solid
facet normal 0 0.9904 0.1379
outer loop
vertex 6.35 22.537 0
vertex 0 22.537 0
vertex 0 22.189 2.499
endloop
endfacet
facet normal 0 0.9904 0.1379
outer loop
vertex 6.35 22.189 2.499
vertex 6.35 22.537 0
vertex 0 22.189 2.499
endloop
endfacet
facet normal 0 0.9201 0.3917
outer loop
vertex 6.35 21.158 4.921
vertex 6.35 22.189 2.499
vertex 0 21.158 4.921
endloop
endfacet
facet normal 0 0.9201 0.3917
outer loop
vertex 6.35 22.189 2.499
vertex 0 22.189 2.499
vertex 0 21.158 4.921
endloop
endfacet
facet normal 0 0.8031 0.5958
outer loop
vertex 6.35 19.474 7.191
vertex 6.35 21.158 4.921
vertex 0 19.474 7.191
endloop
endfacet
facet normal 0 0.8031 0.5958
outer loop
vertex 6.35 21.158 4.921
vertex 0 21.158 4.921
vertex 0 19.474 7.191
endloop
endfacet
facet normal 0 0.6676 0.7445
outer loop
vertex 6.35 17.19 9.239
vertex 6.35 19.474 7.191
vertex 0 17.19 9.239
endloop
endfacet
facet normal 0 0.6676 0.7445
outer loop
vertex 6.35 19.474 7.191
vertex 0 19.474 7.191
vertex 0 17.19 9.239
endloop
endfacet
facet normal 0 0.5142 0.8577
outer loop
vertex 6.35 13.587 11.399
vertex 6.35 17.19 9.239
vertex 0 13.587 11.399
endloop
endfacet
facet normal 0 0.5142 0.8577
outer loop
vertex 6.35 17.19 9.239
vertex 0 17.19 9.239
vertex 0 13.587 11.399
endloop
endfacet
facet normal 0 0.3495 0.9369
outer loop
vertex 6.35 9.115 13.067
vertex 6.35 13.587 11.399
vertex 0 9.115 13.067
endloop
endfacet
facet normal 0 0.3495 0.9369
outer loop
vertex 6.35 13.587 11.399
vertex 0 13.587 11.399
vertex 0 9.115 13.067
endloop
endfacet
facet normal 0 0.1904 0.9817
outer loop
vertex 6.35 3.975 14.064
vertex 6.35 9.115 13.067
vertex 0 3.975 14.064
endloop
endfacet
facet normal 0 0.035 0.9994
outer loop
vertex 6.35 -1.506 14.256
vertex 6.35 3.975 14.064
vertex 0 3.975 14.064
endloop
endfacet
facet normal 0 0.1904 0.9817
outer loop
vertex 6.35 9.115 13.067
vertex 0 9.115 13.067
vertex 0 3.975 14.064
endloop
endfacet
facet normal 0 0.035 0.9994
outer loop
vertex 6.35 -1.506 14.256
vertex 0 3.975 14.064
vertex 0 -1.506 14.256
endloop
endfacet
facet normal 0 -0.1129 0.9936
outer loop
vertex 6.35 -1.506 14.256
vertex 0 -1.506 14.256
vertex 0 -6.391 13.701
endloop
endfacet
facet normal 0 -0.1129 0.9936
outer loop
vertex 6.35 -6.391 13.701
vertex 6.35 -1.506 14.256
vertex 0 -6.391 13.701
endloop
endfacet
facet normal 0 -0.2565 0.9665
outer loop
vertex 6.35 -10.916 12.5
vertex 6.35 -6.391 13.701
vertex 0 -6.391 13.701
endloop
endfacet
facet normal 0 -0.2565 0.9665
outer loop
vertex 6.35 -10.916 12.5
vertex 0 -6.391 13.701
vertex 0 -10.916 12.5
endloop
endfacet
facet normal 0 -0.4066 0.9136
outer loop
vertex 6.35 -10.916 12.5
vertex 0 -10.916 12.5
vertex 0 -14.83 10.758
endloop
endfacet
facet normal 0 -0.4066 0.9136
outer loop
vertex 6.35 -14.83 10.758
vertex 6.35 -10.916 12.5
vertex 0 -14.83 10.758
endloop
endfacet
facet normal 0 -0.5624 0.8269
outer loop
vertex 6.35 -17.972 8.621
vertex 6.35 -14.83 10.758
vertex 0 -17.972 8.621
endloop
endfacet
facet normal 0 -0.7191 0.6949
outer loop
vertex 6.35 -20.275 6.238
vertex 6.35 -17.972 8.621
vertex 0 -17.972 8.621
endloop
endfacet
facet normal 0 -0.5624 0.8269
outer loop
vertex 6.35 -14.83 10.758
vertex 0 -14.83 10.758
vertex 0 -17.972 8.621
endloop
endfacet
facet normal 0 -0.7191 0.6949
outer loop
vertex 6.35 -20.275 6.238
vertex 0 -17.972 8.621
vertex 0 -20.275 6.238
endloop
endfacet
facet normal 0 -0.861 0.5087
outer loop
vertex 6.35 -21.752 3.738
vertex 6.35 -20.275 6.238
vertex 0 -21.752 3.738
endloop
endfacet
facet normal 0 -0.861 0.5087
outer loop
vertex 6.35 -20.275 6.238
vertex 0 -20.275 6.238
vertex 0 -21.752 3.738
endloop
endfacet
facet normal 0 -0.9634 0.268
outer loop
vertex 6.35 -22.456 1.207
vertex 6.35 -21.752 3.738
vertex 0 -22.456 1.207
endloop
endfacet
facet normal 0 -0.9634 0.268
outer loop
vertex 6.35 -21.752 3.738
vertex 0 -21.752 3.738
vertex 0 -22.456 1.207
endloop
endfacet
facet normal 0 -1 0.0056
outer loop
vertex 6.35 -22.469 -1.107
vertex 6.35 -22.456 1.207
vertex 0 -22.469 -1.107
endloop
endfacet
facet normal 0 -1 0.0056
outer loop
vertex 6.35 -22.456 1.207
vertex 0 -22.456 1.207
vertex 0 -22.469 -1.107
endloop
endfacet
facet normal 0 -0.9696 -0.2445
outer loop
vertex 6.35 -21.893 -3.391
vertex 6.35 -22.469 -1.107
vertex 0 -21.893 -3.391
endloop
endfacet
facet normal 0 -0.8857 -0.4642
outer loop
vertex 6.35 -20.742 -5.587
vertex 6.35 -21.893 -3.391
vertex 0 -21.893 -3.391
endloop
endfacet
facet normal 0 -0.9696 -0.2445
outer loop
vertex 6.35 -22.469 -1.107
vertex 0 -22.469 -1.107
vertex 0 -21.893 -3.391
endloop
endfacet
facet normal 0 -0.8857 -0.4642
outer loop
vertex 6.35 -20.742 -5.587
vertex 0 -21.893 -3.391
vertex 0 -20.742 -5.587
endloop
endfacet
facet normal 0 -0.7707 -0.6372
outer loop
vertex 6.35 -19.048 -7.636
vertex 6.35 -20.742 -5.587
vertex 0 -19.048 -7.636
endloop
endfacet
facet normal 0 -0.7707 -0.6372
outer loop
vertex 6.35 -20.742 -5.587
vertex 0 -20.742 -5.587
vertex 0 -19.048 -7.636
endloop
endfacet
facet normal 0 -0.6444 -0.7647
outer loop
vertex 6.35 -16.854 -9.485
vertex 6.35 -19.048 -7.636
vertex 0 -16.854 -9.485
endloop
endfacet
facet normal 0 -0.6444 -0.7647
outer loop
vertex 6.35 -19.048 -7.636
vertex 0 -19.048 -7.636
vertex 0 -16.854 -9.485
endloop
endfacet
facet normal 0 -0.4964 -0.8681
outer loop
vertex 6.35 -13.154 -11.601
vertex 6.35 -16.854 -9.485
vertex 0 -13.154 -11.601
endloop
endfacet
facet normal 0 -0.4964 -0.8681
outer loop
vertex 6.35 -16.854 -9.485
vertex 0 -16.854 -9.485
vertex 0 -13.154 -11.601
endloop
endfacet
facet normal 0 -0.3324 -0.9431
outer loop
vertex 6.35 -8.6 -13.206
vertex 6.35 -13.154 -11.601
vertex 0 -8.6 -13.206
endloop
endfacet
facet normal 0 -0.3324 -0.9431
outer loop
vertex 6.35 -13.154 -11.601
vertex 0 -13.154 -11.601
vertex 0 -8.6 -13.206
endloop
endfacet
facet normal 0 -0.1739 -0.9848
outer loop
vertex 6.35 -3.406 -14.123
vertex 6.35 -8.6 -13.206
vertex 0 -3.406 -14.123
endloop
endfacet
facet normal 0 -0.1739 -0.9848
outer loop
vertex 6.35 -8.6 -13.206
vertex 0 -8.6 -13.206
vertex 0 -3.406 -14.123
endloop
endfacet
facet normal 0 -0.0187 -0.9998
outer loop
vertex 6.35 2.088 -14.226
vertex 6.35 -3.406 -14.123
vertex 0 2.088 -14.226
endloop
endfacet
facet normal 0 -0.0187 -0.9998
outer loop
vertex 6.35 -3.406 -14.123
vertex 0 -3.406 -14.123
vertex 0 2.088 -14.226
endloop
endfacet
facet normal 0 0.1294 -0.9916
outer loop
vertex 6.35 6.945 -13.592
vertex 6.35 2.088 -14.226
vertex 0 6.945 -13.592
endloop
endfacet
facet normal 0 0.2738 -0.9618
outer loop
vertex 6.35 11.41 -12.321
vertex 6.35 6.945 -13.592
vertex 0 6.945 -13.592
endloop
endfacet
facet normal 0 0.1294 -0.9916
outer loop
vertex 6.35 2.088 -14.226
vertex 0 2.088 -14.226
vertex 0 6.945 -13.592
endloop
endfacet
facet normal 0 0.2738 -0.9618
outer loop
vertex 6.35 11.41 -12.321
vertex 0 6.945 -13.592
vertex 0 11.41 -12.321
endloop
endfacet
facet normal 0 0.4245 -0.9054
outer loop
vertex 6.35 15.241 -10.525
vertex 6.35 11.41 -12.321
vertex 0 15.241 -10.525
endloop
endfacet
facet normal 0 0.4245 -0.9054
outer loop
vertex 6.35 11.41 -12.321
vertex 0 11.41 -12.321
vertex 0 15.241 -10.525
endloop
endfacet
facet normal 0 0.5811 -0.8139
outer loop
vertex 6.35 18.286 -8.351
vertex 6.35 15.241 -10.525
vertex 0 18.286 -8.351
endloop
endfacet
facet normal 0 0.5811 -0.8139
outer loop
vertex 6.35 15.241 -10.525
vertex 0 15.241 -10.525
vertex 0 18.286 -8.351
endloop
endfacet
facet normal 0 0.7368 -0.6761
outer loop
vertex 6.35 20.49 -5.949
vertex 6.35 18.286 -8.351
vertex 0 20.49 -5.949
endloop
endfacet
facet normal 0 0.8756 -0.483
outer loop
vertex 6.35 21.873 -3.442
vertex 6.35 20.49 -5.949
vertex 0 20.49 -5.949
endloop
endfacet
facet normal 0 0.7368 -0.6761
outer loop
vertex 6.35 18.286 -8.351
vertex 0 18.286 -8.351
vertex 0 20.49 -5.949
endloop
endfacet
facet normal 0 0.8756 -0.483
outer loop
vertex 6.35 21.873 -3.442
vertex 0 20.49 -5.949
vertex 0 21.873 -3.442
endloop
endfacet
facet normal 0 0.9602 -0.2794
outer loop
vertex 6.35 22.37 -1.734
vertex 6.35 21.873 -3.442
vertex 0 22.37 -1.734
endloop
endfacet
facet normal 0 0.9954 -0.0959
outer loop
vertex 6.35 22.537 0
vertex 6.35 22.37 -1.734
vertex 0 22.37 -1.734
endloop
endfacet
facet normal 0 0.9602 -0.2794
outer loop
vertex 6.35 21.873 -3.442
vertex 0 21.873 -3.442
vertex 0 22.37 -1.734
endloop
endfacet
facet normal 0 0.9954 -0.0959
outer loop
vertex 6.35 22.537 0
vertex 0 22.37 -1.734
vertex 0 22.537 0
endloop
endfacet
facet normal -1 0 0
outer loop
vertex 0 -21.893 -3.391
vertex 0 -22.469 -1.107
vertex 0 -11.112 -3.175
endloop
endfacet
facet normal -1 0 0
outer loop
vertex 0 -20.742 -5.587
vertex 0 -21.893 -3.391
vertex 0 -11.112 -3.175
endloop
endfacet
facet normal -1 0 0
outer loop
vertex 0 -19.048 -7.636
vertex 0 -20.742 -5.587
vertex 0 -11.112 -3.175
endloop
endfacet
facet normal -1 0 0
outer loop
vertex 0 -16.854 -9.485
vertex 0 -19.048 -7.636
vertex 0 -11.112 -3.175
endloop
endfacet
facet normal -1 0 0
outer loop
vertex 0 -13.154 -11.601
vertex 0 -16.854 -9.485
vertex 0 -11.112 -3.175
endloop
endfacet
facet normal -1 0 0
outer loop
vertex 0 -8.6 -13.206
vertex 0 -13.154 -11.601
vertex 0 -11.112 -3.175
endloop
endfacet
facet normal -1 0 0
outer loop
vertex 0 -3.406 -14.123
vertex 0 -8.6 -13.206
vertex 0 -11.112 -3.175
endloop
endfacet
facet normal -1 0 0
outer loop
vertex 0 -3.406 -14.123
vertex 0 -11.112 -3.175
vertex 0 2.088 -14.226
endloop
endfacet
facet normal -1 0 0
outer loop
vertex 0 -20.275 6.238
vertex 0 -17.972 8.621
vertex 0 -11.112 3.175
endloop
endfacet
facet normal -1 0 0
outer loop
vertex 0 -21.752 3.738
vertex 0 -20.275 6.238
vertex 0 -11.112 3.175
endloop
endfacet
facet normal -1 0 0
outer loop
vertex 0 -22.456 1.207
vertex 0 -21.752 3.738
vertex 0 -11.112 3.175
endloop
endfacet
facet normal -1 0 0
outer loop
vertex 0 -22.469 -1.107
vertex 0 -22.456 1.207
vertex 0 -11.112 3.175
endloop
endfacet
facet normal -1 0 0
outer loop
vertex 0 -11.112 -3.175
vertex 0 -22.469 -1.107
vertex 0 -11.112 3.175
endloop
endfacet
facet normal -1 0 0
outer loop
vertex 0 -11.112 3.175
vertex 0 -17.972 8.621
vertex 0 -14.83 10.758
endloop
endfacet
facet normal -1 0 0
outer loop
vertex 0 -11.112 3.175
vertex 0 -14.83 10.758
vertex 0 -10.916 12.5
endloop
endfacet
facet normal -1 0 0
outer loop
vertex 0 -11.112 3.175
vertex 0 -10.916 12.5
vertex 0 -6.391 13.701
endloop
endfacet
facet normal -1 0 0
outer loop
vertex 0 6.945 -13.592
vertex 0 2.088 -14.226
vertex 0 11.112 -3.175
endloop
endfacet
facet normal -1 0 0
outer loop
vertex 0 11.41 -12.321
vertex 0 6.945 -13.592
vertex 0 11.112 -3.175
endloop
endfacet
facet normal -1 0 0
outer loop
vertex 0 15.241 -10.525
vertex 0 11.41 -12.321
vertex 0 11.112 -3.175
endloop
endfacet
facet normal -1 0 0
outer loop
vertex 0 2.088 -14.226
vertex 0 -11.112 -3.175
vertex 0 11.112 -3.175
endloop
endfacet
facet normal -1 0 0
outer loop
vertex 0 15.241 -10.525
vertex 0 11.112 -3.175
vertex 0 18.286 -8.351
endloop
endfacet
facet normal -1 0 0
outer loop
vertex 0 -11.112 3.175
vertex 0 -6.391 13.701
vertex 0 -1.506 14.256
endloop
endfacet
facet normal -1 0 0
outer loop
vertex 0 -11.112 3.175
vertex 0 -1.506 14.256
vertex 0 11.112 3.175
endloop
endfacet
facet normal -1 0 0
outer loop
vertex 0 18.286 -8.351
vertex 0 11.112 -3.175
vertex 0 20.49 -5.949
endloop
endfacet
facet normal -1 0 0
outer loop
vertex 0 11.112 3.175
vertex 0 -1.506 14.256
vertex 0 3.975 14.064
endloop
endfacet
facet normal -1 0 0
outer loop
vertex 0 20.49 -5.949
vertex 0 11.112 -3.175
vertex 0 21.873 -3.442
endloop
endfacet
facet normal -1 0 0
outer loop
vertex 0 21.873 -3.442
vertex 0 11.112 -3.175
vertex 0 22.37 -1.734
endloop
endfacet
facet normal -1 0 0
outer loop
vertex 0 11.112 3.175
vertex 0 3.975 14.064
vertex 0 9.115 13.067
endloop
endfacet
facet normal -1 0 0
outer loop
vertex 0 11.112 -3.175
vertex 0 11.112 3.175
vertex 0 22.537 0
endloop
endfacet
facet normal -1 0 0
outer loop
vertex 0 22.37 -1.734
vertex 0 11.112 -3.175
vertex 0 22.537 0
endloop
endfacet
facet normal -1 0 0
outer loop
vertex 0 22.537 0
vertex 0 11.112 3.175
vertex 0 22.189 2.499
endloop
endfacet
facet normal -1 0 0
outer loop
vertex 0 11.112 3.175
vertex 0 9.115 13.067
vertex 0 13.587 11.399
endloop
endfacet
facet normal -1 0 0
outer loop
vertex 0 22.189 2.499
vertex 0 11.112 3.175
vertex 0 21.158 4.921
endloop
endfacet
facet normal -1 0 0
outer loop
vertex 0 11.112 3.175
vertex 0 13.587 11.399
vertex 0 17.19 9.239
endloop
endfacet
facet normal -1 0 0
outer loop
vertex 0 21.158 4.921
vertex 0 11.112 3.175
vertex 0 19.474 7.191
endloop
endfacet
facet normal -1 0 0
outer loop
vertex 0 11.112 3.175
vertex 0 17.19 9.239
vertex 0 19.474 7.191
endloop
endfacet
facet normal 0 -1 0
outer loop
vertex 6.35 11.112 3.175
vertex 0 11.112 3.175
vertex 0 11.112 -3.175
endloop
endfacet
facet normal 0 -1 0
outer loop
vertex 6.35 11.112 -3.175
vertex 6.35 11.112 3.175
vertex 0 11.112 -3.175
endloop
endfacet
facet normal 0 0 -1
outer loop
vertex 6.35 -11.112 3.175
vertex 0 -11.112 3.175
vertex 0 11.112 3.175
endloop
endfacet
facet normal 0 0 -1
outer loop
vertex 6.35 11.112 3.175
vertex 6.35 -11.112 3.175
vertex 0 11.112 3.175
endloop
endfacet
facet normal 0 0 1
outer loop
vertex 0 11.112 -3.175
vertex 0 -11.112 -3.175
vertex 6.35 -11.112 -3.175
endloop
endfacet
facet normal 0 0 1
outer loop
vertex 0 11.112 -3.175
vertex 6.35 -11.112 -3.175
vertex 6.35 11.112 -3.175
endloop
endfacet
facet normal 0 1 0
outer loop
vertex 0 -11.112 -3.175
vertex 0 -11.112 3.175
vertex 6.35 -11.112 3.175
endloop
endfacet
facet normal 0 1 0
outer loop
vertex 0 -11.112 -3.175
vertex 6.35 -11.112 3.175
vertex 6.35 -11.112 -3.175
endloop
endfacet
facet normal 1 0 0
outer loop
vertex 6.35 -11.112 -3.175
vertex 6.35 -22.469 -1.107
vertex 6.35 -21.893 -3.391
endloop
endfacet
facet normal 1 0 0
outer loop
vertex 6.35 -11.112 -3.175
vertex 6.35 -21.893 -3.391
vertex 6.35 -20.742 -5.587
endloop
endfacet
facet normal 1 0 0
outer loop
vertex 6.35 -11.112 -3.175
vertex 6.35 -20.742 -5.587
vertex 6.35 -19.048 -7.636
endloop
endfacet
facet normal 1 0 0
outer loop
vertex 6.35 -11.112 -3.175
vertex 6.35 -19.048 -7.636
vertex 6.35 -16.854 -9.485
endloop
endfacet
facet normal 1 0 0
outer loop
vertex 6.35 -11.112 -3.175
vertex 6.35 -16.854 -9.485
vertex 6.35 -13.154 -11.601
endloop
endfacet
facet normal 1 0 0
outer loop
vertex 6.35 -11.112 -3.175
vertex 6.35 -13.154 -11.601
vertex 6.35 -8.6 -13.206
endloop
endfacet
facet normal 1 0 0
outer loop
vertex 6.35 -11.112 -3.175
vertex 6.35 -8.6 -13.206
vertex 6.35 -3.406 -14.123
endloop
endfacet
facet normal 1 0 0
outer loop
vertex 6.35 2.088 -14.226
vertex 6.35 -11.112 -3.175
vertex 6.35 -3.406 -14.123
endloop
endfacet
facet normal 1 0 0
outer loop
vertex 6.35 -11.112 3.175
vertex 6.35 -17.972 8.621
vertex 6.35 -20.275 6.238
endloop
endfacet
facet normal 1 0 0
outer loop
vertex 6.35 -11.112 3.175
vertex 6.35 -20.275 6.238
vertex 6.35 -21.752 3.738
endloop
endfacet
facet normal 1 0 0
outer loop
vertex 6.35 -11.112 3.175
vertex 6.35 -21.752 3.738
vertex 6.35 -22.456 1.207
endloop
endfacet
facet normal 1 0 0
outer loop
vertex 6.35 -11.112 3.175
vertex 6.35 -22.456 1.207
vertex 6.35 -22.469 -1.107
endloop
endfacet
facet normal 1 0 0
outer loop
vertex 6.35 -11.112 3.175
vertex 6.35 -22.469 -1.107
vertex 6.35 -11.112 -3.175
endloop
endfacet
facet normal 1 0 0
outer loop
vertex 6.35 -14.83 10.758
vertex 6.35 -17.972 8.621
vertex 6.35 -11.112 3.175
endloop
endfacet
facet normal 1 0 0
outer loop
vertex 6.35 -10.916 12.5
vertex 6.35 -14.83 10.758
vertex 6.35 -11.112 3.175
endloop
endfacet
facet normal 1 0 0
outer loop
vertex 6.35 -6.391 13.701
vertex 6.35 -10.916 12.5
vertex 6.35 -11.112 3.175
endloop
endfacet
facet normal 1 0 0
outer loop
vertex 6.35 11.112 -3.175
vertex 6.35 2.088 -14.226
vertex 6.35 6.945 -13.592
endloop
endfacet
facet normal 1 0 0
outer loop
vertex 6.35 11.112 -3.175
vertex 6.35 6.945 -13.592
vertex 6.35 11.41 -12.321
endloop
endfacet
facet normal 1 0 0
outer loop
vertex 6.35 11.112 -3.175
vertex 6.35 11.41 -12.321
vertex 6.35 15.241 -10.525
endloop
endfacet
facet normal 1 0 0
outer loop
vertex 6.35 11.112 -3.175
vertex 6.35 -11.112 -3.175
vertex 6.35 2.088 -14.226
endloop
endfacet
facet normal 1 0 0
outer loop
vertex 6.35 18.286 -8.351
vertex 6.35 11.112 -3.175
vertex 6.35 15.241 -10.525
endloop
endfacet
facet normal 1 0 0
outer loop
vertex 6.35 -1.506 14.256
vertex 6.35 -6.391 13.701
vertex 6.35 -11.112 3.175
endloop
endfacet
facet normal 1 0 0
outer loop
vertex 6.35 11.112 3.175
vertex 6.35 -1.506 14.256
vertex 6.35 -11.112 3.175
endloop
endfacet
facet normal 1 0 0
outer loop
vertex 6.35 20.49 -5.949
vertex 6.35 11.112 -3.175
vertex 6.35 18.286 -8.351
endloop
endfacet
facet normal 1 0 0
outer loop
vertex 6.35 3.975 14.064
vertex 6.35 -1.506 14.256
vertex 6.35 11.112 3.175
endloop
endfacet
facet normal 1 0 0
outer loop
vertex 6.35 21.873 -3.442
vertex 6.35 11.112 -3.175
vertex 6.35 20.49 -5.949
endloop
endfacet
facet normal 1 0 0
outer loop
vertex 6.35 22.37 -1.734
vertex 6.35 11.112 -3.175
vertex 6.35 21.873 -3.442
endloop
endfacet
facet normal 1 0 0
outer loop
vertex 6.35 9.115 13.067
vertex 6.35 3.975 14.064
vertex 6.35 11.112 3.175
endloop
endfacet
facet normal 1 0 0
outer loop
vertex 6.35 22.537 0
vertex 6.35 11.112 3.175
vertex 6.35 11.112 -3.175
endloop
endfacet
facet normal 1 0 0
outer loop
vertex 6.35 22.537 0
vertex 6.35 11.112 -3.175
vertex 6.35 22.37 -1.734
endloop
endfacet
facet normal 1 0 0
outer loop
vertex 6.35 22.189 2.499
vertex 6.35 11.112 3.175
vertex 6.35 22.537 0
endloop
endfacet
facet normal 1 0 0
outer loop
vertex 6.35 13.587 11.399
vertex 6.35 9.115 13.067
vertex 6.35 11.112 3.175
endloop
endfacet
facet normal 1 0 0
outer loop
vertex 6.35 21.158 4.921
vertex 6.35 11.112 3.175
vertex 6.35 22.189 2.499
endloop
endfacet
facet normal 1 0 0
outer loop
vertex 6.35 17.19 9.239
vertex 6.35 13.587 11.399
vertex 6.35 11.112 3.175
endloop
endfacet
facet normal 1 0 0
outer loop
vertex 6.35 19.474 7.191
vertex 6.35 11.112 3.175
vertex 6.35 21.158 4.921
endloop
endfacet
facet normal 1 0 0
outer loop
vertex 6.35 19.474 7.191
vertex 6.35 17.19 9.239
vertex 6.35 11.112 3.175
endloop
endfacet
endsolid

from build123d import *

# Parameters (mm, degrees)
SKETCH1_RX          = 22.536539577
SKETCH1_RY          = 14.2875
SKETCH1_W           = 6.35
SKETCH1_H           = 22.225
BOSS_EXTRUDE1_DEPTH = 6.35


with BuildPart() as part:
    # Sketch1 → Boss-Extrude1 (new body)
    with BuildSketch(Plane(origin=(0, 0, 0), x_dir=(0, 0, -1), z_dir=(1, 0, 0))):
        with Locations(Location((0, 0), (0, 0, 90))):
            Ellipse(SKETCH1_RX, SKETCH1_RY)
        Rectangle(SKETCH1_W, SKETCH1_H, mode=Mode.SUBTRACT)
    extrude(amount=BOSS_EXTRUDE1_DEPTH)


solid = part.part
